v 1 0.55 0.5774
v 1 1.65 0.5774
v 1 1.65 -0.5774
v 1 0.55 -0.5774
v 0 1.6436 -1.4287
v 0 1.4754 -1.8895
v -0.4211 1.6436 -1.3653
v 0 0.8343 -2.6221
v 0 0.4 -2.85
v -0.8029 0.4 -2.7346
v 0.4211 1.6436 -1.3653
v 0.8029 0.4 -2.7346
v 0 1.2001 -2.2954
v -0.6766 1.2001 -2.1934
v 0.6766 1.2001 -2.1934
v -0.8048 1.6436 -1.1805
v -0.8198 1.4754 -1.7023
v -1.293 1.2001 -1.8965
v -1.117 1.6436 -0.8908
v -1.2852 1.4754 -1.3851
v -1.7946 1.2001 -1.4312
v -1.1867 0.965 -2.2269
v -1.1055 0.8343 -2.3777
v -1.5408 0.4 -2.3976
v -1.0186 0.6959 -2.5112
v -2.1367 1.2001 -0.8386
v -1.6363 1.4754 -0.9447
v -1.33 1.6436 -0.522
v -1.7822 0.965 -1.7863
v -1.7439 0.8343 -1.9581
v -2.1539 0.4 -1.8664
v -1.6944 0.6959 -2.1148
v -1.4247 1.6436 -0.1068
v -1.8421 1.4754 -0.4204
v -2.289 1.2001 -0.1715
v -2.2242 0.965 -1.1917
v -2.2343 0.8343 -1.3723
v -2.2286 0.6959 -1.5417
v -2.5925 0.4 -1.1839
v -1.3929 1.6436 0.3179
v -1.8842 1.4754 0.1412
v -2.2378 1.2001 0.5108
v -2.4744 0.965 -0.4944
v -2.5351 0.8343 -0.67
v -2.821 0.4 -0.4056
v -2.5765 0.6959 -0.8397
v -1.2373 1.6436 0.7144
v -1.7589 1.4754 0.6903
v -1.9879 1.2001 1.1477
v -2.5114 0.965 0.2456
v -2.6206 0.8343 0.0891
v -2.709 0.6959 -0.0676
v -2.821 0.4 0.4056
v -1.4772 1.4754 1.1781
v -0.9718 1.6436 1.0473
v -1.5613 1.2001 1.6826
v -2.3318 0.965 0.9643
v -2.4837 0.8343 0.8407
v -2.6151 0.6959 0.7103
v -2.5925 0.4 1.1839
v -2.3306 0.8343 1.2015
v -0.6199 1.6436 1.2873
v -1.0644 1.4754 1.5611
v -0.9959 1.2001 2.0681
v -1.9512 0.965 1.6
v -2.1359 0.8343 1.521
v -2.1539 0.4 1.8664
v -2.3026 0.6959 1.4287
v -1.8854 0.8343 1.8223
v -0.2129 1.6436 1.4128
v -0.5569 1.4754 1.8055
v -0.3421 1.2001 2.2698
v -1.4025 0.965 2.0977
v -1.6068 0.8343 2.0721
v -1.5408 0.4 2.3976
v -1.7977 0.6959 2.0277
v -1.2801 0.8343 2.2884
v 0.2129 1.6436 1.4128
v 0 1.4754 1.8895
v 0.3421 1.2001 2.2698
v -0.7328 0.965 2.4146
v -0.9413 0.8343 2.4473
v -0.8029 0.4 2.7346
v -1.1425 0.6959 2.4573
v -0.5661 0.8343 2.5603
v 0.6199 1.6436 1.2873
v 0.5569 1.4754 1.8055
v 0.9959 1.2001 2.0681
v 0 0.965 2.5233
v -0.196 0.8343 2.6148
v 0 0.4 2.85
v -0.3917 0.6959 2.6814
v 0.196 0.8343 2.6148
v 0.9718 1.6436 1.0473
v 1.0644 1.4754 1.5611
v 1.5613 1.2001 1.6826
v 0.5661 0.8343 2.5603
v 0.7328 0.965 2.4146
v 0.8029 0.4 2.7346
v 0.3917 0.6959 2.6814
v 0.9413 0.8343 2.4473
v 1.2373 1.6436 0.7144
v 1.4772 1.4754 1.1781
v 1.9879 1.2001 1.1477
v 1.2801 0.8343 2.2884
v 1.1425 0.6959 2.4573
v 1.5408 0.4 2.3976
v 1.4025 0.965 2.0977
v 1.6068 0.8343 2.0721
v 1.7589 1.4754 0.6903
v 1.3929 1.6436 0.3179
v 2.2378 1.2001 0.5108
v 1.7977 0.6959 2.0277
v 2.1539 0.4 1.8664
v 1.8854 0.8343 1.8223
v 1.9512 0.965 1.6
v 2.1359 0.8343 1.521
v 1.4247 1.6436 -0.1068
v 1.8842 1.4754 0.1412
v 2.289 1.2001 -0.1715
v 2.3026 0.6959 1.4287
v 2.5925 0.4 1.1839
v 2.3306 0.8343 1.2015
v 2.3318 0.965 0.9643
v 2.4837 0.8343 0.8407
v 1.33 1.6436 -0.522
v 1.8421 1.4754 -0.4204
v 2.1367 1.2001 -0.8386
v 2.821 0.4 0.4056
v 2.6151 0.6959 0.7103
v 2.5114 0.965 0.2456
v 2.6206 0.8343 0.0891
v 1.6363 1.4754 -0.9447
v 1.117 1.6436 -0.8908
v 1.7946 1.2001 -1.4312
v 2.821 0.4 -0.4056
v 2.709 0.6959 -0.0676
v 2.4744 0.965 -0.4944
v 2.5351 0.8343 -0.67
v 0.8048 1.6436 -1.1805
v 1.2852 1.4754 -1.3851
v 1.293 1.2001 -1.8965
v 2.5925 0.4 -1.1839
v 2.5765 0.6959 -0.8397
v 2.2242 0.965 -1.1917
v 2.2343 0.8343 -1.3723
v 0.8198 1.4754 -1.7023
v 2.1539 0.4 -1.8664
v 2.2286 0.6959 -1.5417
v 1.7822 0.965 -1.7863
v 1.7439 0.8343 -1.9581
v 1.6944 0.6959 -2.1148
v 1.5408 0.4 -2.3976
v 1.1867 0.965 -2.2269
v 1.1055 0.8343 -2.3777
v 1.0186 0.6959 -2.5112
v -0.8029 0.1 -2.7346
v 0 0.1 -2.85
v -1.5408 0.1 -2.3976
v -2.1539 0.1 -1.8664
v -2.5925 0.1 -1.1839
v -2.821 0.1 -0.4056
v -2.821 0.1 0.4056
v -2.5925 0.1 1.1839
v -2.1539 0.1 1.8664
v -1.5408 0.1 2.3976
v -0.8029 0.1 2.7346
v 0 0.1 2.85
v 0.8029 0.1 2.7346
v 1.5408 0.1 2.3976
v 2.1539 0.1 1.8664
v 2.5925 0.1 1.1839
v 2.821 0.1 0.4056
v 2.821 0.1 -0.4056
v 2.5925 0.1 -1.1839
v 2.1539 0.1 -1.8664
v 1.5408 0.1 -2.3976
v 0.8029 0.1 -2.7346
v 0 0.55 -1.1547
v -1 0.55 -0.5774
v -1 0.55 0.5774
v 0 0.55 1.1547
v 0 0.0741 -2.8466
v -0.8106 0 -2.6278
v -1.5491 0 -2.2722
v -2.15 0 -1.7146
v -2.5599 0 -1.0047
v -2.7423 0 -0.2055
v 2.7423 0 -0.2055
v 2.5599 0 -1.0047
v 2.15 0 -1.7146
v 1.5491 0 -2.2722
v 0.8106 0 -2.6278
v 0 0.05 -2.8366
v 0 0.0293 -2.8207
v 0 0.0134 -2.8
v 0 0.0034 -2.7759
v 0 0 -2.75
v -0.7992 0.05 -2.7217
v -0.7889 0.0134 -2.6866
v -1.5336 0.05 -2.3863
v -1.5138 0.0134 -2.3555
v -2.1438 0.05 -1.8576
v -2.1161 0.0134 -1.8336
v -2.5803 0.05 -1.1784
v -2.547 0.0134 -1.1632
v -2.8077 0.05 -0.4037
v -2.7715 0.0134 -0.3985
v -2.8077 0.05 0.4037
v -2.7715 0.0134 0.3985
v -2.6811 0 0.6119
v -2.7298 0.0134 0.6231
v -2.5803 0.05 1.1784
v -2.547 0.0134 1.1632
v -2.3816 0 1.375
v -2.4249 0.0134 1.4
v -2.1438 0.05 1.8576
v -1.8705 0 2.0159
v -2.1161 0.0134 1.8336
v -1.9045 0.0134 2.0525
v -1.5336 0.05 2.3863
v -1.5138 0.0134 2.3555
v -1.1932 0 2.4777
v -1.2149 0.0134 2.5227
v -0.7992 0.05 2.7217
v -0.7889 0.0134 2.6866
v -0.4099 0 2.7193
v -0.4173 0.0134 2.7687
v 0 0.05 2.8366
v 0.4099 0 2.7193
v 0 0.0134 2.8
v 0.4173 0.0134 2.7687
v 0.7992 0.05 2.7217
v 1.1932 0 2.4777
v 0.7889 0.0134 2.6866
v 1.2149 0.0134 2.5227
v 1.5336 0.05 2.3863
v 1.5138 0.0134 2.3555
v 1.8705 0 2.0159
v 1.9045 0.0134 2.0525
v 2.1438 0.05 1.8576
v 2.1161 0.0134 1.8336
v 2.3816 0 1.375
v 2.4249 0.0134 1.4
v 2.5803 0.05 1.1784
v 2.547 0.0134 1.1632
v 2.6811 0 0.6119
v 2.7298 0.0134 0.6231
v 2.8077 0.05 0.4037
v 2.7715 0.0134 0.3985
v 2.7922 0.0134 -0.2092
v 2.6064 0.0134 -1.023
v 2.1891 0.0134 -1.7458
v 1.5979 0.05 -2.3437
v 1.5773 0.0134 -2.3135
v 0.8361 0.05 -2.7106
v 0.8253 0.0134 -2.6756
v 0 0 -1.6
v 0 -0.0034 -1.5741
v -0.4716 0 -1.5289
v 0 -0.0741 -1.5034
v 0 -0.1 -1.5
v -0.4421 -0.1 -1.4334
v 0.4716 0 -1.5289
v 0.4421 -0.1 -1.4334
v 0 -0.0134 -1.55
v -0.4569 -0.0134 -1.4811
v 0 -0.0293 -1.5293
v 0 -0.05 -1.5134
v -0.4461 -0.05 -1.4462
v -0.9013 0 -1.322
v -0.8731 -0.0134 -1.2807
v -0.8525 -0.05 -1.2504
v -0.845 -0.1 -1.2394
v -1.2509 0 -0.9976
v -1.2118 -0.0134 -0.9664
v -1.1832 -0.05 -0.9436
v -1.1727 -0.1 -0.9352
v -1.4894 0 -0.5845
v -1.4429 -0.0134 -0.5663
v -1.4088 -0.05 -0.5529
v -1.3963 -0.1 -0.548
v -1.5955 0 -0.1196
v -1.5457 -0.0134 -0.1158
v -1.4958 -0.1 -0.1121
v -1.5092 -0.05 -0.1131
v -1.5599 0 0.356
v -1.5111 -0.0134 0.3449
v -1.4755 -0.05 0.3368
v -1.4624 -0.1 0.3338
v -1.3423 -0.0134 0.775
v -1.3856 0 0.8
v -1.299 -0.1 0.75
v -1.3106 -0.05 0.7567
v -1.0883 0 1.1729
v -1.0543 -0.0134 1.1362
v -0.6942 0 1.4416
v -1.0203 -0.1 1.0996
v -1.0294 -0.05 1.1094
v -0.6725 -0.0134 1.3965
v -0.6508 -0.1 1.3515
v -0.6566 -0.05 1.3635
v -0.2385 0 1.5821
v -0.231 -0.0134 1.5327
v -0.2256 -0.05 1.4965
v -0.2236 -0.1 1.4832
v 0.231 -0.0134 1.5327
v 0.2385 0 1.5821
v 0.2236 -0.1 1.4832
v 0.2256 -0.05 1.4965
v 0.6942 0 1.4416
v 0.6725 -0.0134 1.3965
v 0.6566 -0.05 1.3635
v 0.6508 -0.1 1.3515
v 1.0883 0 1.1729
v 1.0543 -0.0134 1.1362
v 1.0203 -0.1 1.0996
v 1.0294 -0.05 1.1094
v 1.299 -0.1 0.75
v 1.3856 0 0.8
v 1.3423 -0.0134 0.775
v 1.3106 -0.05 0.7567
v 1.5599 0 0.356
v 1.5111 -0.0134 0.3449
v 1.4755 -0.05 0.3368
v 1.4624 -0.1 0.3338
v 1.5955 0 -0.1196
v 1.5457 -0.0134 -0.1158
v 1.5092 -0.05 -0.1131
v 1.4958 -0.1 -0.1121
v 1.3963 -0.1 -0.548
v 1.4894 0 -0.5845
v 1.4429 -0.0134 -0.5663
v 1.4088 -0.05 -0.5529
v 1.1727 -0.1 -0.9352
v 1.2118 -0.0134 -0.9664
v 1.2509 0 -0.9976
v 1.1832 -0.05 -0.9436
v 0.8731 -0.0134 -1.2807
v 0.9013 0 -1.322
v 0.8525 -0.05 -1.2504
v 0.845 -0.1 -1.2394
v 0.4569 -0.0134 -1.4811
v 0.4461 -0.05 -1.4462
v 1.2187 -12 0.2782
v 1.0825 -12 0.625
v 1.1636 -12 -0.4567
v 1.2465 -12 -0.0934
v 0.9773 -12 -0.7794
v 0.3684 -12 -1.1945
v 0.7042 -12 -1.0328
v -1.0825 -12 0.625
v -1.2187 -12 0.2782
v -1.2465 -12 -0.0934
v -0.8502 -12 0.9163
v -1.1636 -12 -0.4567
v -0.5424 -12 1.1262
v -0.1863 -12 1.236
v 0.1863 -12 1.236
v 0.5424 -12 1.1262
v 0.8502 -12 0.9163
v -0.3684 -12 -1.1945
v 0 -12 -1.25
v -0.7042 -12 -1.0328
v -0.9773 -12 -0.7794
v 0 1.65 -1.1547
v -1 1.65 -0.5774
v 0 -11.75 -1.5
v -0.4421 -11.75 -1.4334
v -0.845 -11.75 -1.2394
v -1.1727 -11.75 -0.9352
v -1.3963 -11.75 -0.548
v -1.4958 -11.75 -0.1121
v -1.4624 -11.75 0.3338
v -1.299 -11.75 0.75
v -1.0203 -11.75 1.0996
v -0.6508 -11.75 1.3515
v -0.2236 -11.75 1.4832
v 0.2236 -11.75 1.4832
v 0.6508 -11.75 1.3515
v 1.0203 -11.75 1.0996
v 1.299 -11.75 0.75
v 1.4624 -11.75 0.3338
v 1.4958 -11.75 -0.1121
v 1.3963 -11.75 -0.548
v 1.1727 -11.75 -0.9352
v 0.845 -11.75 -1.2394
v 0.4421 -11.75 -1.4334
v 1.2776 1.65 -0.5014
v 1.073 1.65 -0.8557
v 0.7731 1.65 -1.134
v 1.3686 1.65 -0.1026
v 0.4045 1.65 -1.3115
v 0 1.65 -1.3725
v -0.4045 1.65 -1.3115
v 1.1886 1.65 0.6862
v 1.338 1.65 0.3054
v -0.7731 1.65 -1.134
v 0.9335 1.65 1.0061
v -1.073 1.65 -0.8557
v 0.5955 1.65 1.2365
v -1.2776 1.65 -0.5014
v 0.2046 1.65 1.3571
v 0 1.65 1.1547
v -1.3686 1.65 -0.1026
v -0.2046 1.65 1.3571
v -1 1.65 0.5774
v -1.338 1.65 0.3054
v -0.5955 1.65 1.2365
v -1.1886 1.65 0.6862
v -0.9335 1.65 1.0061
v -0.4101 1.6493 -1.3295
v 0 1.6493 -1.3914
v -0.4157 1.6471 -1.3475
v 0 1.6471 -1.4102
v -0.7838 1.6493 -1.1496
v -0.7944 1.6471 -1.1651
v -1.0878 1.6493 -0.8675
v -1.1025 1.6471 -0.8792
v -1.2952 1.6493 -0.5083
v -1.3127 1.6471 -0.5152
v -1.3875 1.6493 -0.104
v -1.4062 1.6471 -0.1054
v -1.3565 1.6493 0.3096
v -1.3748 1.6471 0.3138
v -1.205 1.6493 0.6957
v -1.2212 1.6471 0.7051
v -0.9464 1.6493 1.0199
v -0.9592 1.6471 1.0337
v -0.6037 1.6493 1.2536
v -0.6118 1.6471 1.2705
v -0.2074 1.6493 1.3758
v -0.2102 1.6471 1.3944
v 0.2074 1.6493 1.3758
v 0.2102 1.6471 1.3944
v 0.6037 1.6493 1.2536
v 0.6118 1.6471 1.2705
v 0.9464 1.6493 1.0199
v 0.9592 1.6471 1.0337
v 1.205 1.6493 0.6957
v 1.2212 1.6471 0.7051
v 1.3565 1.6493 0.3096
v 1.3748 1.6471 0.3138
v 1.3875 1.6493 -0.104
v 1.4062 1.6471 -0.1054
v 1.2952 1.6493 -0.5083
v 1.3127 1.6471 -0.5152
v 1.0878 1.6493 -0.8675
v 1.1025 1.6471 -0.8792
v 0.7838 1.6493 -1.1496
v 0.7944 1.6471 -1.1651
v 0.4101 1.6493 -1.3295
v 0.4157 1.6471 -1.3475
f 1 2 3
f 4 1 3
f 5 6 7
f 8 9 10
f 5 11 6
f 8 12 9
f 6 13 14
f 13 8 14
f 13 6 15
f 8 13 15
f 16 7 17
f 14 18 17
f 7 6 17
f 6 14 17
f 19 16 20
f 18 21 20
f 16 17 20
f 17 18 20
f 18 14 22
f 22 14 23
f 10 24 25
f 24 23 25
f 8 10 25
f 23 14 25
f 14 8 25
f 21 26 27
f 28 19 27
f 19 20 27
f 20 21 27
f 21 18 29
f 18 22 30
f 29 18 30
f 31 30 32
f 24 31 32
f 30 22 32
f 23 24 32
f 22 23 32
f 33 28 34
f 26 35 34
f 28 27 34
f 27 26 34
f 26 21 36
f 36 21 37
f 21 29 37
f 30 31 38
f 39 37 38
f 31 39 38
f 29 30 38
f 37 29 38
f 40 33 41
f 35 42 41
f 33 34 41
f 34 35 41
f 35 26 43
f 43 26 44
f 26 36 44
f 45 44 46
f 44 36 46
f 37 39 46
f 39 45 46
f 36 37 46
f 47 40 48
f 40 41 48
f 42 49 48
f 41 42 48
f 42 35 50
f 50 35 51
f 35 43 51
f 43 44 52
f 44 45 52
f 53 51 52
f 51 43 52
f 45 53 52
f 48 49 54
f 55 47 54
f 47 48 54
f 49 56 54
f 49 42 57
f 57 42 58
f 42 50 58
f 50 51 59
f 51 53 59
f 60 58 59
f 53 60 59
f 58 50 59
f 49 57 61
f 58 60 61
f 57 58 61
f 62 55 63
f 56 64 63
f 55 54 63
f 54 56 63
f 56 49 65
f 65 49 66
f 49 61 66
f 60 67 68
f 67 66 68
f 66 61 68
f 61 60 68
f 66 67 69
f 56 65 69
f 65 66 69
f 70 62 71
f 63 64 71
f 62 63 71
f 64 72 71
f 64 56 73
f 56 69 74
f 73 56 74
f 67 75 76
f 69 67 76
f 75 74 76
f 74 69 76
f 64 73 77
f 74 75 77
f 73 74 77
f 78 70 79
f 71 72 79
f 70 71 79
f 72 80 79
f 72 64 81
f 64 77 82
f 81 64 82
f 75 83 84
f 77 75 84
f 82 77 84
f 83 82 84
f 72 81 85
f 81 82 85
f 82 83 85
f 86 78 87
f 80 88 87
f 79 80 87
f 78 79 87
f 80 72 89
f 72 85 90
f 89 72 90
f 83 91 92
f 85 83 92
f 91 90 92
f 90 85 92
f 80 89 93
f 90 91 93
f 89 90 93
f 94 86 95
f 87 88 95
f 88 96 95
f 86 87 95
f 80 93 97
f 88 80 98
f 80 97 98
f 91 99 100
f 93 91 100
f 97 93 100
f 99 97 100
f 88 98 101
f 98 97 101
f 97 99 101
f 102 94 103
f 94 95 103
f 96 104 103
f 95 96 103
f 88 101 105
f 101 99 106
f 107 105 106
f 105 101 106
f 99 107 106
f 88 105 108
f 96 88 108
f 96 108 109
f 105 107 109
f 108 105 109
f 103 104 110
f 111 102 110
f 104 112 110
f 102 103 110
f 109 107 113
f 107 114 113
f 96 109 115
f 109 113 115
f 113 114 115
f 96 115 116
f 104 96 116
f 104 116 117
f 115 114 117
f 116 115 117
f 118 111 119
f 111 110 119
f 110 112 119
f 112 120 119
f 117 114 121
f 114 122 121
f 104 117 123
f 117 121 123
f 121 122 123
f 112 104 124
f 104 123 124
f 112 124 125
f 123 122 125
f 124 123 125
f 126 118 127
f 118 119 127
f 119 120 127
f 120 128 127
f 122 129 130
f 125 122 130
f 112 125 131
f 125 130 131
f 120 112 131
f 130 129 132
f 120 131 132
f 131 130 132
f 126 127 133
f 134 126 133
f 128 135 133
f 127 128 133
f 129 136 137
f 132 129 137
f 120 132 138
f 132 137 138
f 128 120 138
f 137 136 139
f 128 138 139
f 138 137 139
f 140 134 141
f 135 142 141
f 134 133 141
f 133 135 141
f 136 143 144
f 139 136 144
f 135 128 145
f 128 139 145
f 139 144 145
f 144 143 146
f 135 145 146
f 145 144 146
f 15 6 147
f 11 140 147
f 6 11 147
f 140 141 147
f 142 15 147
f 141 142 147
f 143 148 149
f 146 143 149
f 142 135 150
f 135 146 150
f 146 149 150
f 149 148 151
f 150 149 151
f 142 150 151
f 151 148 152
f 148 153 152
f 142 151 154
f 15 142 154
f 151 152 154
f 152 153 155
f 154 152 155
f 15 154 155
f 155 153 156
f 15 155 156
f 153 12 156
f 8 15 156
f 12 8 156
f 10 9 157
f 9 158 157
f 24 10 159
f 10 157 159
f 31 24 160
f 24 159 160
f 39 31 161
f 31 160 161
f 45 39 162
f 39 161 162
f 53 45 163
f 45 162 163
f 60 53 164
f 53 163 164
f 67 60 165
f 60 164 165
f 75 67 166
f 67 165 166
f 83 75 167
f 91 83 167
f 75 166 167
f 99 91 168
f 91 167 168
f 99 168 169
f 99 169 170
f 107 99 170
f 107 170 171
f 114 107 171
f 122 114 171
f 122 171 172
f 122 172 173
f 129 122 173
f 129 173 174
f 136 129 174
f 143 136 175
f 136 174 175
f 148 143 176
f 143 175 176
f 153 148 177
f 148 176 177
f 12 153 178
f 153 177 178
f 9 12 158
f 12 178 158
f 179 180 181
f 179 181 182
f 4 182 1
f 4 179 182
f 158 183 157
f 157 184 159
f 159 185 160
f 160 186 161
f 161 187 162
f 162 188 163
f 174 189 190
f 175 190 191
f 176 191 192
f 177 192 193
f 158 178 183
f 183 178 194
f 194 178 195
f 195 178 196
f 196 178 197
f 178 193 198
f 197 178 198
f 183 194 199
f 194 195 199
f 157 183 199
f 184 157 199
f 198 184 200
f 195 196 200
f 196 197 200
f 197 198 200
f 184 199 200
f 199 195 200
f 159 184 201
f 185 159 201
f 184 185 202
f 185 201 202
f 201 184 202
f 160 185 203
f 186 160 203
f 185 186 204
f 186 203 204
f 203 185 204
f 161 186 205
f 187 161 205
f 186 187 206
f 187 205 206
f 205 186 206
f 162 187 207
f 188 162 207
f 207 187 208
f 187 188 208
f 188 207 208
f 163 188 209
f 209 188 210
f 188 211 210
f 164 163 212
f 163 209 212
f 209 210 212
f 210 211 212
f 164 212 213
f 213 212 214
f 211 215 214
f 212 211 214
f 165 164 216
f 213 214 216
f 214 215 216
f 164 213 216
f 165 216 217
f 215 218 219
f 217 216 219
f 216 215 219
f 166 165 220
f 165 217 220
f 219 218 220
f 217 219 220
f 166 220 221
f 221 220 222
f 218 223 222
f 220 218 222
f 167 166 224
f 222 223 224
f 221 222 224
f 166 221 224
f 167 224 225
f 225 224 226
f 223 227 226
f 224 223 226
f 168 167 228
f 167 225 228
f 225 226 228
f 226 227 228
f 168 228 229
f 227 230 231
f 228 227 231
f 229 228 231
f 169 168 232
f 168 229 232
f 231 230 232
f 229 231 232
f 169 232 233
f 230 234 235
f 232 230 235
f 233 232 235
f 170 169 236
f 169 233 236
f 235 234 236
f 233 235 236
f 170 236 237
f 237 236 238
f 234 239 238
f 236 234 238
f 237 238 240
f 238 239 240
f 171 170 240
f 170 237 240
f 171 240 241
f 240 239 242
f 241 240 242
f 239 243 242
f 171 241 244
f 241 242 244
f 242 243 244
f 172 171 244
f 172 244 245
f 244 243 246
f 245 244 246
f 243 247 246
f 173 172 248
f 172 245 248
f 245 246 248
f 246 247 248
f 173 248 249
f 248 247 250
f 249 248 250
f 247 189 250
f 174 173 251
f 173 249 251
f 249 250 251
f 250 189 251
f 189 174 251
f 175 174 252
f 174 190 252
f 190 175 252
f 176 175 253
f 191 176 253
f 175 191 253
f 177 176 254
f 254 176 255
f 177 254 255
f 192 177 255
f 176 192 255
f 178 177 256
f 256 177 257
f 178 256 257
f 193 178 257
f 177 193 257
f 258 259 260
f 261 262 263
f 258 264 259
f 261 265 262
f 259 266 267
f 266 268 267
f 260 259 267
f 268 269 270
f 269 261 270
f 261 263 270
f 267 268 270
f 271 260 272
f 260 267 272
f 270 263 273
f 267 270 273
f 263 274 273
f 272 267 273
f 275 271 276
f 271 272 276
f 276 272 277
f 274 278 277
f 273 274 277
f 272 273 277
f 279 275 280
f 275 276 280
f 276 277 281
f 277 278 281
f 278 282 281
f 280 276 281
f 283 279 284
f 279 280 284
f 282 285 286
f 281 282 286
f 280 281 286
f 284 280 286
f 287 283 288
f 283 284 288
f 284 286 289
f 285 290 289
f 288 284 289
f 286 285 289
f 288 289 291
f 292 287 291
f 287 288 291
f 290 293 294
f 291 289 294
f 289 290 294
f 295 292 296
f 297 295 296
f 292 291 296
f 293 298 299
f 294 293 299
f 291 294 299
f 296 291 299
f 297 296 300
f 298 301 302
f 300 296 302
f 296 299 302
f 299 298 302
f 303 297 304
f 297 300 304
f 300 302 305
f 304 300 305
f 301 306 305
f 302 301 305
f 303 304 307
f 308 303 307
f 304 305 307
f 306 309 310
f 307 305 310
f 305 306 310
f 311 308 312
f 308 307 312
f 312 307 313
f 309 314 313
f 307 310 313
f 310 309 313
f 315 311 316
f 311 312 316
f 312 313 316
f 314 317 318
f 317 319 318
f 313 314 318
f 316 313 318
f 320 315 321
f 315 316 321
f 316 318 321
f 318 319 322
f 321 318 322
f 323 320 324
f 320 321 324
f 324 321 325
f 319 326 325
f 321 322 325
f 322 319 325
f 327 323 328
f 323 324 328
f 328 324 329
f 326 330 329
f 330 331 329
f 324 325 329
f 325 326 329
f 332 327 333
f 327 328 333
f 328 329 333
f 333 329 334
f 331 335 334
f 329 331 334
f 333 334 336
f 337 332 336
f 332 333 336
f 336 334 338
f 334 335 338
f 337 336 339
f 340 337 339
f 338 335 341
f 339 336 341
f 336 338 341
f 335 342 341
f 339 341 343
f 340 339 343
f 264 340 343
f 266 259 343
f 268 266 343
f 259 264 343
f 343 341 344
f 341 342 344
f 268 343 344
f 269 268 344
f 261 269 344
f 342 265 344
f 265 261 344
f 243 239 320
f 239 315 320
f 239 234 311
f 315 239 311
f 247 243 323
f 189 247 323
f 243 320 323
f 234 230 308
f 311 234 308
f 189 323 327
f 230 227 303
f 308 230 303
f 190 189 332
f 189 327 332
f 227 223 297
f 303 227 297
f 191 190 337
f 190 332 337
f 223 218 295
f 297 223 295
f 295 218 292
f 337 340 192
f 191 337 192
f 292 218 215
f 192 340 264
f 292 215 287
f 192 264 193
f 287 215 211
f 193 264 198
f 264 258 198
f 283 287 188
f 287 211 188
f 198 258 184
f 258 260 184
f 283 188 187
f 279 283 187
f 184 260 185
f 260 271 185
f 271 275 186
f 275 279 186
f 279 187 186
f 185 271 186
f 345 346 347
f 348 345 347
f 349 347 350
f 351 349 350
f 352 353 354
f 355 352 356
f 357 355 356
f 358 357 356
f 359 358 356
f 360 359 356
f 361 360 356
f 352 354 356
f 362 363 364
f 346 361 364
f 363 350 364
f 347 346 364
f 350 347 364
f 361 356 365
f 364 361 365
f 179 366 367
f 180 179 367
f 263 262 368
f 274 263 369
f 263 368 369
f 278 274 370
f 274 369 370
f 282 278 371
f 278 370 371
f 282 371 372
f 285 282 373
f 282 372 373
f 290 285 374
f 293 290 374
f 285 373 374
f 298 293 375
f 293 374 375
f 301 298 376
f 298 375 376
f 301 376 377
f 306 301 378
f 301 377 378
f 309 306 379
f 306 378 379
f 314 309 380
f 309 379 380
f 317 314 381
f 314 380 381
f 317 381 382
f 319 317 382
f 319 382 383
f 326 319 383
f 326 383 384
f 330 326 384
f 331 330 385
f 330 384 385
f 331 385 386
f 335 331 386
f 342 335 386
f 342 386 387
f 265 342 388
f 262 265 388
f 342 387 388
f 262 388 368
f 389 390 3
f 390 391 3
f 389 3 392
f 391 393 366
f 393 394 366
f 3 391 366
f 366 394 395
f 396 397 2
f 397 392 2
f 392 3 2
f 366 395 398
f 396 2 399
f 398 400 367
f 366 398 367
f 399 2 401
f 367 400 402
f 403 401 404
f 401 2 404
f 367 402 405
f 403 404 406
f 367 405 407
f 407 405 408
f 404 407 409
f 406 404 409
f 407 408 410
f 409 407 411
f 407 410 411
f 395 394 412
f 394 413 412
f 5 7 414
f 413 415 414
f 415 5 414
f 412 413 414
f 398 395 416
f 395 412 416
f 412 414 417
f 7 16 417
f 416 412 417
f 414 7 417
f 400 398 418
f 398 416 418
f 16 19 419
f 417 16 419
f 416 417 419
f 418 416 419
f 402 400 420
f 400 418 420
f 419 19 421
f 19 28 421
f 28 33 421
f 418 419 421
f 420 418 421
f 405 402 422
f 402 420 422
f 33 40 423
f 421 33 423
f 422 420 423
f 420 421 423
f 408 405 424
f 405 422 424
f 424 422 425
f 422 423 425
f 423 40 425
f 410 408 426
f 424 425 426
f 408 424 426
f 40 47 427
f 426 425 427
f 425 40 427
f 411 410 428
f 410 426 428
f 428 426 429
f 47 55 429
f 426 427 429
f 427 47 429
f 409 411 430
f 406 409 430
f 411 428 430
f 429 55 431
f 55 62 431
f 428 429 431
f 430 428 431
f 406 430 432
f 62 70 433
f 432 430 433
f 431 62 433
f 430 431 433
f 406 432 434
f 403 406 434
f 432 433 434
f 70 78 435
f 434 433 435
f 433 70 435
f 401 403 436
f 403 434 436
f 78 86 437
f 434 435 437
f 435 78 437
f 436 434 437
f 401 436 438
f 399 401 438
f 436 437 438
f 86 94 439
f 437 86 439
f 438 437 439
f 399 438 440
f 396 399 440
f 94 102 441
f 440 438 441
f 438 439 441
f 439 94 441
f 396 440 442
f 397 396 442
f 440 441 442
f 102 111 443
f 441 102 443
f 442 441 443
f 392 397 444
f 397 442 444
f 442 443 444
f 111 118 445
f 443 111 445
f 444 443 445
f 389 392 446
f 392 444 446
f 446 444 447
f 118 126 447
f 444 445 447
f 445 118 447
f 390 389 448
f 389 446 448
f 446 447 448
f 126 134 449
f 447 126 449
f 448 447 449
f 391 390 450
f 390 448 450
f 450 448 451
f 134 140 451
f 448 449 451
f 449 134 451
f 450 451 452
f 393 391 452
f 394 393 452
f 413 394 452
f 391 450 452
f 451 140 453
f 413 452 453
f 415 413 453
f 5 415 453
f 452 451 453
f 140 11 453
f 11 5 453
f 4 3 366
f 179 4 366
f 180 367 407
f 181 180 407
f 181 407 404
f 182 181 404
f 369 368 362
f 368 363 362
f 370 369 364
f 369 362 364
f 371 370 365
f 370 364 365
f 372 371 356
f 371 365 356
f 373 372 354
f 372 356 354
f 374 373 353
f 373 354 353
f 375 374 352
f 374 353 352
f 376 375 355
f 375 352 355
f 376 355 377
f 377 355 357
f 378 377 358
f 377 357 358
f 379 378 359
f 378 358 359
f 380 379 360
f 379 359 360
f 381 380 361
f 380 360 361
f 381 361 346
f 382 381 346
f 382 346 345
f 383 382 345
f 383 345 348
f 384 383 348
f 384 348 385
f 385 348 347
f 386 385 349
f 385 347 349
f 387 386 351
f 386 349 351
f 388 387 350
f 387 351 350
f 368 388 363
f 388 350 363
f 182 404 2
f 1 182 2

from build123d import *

# Parameters (mm, degrees)
CUT_EXTRUDE1_DEPTH = 1.1


with BuildPart() as part:
    # Sketch1 → Revolve1 (revolve)
    with BuildSketch(Plane.XY, mode=Mode.PRIVATE) as revolve1_sk:
        with BuildLine():
            Line((-1.5, -0.1), (-1.5, -11.75))
            Line((-1.5, -11.75), (-1.25, -12))
            Line((-1.25, -12), (0, -12))
            Line((0, -12), (0, 1.65))
            Line((0, 1.65), (-1.372450351, 1.65))
            ThreePointArc((-1.372450351, 1.65), (-1.400779398, 1.648389744), (-1.42874351, 1.643579721))
            ThreePointArc((-1.42874351, 1.643579721), (-2.295395633, 1.200105689), (-2.85, 0.4))
            Line((-2.85, 0.4), (-2.85, 0.1))
            ThreePointArc((-2.85, 0.1), (-2.820710678, 0.029289322), (-2.75, 0))
            Line((-2.75, 0), (-1.6, 0))
            ThreePointArc((-1.6, 0), (-1.529289322, -0.029289322), (-1.5, -0.1))
        make_face()
    revolve(revolve1_sk.sketch.rotate(Axis((0, -12, 0), (0, 1, 0)), 270), axis=Axis((0, -12, 0), (0, 1, 0)))

    # Sketch2 → Cut-Extrude1 (cut)
    with BuildSketch(Plane(origin=(0, 1.65, 0), x_dir=(1, 0, 0), z_dir=(0, 1, 0))):
        Polygon((-1, 0.577350269), (-1, -0.577350269), (0, -1.154700538), (1, -0.577350269), (1, 0.577350269), (0, 1.154700538), align=None)
    extrude(amount=-CUT_EXTRUDE1_DEPTH, mode=Mode.SUBTRACT)


solid = part.part
